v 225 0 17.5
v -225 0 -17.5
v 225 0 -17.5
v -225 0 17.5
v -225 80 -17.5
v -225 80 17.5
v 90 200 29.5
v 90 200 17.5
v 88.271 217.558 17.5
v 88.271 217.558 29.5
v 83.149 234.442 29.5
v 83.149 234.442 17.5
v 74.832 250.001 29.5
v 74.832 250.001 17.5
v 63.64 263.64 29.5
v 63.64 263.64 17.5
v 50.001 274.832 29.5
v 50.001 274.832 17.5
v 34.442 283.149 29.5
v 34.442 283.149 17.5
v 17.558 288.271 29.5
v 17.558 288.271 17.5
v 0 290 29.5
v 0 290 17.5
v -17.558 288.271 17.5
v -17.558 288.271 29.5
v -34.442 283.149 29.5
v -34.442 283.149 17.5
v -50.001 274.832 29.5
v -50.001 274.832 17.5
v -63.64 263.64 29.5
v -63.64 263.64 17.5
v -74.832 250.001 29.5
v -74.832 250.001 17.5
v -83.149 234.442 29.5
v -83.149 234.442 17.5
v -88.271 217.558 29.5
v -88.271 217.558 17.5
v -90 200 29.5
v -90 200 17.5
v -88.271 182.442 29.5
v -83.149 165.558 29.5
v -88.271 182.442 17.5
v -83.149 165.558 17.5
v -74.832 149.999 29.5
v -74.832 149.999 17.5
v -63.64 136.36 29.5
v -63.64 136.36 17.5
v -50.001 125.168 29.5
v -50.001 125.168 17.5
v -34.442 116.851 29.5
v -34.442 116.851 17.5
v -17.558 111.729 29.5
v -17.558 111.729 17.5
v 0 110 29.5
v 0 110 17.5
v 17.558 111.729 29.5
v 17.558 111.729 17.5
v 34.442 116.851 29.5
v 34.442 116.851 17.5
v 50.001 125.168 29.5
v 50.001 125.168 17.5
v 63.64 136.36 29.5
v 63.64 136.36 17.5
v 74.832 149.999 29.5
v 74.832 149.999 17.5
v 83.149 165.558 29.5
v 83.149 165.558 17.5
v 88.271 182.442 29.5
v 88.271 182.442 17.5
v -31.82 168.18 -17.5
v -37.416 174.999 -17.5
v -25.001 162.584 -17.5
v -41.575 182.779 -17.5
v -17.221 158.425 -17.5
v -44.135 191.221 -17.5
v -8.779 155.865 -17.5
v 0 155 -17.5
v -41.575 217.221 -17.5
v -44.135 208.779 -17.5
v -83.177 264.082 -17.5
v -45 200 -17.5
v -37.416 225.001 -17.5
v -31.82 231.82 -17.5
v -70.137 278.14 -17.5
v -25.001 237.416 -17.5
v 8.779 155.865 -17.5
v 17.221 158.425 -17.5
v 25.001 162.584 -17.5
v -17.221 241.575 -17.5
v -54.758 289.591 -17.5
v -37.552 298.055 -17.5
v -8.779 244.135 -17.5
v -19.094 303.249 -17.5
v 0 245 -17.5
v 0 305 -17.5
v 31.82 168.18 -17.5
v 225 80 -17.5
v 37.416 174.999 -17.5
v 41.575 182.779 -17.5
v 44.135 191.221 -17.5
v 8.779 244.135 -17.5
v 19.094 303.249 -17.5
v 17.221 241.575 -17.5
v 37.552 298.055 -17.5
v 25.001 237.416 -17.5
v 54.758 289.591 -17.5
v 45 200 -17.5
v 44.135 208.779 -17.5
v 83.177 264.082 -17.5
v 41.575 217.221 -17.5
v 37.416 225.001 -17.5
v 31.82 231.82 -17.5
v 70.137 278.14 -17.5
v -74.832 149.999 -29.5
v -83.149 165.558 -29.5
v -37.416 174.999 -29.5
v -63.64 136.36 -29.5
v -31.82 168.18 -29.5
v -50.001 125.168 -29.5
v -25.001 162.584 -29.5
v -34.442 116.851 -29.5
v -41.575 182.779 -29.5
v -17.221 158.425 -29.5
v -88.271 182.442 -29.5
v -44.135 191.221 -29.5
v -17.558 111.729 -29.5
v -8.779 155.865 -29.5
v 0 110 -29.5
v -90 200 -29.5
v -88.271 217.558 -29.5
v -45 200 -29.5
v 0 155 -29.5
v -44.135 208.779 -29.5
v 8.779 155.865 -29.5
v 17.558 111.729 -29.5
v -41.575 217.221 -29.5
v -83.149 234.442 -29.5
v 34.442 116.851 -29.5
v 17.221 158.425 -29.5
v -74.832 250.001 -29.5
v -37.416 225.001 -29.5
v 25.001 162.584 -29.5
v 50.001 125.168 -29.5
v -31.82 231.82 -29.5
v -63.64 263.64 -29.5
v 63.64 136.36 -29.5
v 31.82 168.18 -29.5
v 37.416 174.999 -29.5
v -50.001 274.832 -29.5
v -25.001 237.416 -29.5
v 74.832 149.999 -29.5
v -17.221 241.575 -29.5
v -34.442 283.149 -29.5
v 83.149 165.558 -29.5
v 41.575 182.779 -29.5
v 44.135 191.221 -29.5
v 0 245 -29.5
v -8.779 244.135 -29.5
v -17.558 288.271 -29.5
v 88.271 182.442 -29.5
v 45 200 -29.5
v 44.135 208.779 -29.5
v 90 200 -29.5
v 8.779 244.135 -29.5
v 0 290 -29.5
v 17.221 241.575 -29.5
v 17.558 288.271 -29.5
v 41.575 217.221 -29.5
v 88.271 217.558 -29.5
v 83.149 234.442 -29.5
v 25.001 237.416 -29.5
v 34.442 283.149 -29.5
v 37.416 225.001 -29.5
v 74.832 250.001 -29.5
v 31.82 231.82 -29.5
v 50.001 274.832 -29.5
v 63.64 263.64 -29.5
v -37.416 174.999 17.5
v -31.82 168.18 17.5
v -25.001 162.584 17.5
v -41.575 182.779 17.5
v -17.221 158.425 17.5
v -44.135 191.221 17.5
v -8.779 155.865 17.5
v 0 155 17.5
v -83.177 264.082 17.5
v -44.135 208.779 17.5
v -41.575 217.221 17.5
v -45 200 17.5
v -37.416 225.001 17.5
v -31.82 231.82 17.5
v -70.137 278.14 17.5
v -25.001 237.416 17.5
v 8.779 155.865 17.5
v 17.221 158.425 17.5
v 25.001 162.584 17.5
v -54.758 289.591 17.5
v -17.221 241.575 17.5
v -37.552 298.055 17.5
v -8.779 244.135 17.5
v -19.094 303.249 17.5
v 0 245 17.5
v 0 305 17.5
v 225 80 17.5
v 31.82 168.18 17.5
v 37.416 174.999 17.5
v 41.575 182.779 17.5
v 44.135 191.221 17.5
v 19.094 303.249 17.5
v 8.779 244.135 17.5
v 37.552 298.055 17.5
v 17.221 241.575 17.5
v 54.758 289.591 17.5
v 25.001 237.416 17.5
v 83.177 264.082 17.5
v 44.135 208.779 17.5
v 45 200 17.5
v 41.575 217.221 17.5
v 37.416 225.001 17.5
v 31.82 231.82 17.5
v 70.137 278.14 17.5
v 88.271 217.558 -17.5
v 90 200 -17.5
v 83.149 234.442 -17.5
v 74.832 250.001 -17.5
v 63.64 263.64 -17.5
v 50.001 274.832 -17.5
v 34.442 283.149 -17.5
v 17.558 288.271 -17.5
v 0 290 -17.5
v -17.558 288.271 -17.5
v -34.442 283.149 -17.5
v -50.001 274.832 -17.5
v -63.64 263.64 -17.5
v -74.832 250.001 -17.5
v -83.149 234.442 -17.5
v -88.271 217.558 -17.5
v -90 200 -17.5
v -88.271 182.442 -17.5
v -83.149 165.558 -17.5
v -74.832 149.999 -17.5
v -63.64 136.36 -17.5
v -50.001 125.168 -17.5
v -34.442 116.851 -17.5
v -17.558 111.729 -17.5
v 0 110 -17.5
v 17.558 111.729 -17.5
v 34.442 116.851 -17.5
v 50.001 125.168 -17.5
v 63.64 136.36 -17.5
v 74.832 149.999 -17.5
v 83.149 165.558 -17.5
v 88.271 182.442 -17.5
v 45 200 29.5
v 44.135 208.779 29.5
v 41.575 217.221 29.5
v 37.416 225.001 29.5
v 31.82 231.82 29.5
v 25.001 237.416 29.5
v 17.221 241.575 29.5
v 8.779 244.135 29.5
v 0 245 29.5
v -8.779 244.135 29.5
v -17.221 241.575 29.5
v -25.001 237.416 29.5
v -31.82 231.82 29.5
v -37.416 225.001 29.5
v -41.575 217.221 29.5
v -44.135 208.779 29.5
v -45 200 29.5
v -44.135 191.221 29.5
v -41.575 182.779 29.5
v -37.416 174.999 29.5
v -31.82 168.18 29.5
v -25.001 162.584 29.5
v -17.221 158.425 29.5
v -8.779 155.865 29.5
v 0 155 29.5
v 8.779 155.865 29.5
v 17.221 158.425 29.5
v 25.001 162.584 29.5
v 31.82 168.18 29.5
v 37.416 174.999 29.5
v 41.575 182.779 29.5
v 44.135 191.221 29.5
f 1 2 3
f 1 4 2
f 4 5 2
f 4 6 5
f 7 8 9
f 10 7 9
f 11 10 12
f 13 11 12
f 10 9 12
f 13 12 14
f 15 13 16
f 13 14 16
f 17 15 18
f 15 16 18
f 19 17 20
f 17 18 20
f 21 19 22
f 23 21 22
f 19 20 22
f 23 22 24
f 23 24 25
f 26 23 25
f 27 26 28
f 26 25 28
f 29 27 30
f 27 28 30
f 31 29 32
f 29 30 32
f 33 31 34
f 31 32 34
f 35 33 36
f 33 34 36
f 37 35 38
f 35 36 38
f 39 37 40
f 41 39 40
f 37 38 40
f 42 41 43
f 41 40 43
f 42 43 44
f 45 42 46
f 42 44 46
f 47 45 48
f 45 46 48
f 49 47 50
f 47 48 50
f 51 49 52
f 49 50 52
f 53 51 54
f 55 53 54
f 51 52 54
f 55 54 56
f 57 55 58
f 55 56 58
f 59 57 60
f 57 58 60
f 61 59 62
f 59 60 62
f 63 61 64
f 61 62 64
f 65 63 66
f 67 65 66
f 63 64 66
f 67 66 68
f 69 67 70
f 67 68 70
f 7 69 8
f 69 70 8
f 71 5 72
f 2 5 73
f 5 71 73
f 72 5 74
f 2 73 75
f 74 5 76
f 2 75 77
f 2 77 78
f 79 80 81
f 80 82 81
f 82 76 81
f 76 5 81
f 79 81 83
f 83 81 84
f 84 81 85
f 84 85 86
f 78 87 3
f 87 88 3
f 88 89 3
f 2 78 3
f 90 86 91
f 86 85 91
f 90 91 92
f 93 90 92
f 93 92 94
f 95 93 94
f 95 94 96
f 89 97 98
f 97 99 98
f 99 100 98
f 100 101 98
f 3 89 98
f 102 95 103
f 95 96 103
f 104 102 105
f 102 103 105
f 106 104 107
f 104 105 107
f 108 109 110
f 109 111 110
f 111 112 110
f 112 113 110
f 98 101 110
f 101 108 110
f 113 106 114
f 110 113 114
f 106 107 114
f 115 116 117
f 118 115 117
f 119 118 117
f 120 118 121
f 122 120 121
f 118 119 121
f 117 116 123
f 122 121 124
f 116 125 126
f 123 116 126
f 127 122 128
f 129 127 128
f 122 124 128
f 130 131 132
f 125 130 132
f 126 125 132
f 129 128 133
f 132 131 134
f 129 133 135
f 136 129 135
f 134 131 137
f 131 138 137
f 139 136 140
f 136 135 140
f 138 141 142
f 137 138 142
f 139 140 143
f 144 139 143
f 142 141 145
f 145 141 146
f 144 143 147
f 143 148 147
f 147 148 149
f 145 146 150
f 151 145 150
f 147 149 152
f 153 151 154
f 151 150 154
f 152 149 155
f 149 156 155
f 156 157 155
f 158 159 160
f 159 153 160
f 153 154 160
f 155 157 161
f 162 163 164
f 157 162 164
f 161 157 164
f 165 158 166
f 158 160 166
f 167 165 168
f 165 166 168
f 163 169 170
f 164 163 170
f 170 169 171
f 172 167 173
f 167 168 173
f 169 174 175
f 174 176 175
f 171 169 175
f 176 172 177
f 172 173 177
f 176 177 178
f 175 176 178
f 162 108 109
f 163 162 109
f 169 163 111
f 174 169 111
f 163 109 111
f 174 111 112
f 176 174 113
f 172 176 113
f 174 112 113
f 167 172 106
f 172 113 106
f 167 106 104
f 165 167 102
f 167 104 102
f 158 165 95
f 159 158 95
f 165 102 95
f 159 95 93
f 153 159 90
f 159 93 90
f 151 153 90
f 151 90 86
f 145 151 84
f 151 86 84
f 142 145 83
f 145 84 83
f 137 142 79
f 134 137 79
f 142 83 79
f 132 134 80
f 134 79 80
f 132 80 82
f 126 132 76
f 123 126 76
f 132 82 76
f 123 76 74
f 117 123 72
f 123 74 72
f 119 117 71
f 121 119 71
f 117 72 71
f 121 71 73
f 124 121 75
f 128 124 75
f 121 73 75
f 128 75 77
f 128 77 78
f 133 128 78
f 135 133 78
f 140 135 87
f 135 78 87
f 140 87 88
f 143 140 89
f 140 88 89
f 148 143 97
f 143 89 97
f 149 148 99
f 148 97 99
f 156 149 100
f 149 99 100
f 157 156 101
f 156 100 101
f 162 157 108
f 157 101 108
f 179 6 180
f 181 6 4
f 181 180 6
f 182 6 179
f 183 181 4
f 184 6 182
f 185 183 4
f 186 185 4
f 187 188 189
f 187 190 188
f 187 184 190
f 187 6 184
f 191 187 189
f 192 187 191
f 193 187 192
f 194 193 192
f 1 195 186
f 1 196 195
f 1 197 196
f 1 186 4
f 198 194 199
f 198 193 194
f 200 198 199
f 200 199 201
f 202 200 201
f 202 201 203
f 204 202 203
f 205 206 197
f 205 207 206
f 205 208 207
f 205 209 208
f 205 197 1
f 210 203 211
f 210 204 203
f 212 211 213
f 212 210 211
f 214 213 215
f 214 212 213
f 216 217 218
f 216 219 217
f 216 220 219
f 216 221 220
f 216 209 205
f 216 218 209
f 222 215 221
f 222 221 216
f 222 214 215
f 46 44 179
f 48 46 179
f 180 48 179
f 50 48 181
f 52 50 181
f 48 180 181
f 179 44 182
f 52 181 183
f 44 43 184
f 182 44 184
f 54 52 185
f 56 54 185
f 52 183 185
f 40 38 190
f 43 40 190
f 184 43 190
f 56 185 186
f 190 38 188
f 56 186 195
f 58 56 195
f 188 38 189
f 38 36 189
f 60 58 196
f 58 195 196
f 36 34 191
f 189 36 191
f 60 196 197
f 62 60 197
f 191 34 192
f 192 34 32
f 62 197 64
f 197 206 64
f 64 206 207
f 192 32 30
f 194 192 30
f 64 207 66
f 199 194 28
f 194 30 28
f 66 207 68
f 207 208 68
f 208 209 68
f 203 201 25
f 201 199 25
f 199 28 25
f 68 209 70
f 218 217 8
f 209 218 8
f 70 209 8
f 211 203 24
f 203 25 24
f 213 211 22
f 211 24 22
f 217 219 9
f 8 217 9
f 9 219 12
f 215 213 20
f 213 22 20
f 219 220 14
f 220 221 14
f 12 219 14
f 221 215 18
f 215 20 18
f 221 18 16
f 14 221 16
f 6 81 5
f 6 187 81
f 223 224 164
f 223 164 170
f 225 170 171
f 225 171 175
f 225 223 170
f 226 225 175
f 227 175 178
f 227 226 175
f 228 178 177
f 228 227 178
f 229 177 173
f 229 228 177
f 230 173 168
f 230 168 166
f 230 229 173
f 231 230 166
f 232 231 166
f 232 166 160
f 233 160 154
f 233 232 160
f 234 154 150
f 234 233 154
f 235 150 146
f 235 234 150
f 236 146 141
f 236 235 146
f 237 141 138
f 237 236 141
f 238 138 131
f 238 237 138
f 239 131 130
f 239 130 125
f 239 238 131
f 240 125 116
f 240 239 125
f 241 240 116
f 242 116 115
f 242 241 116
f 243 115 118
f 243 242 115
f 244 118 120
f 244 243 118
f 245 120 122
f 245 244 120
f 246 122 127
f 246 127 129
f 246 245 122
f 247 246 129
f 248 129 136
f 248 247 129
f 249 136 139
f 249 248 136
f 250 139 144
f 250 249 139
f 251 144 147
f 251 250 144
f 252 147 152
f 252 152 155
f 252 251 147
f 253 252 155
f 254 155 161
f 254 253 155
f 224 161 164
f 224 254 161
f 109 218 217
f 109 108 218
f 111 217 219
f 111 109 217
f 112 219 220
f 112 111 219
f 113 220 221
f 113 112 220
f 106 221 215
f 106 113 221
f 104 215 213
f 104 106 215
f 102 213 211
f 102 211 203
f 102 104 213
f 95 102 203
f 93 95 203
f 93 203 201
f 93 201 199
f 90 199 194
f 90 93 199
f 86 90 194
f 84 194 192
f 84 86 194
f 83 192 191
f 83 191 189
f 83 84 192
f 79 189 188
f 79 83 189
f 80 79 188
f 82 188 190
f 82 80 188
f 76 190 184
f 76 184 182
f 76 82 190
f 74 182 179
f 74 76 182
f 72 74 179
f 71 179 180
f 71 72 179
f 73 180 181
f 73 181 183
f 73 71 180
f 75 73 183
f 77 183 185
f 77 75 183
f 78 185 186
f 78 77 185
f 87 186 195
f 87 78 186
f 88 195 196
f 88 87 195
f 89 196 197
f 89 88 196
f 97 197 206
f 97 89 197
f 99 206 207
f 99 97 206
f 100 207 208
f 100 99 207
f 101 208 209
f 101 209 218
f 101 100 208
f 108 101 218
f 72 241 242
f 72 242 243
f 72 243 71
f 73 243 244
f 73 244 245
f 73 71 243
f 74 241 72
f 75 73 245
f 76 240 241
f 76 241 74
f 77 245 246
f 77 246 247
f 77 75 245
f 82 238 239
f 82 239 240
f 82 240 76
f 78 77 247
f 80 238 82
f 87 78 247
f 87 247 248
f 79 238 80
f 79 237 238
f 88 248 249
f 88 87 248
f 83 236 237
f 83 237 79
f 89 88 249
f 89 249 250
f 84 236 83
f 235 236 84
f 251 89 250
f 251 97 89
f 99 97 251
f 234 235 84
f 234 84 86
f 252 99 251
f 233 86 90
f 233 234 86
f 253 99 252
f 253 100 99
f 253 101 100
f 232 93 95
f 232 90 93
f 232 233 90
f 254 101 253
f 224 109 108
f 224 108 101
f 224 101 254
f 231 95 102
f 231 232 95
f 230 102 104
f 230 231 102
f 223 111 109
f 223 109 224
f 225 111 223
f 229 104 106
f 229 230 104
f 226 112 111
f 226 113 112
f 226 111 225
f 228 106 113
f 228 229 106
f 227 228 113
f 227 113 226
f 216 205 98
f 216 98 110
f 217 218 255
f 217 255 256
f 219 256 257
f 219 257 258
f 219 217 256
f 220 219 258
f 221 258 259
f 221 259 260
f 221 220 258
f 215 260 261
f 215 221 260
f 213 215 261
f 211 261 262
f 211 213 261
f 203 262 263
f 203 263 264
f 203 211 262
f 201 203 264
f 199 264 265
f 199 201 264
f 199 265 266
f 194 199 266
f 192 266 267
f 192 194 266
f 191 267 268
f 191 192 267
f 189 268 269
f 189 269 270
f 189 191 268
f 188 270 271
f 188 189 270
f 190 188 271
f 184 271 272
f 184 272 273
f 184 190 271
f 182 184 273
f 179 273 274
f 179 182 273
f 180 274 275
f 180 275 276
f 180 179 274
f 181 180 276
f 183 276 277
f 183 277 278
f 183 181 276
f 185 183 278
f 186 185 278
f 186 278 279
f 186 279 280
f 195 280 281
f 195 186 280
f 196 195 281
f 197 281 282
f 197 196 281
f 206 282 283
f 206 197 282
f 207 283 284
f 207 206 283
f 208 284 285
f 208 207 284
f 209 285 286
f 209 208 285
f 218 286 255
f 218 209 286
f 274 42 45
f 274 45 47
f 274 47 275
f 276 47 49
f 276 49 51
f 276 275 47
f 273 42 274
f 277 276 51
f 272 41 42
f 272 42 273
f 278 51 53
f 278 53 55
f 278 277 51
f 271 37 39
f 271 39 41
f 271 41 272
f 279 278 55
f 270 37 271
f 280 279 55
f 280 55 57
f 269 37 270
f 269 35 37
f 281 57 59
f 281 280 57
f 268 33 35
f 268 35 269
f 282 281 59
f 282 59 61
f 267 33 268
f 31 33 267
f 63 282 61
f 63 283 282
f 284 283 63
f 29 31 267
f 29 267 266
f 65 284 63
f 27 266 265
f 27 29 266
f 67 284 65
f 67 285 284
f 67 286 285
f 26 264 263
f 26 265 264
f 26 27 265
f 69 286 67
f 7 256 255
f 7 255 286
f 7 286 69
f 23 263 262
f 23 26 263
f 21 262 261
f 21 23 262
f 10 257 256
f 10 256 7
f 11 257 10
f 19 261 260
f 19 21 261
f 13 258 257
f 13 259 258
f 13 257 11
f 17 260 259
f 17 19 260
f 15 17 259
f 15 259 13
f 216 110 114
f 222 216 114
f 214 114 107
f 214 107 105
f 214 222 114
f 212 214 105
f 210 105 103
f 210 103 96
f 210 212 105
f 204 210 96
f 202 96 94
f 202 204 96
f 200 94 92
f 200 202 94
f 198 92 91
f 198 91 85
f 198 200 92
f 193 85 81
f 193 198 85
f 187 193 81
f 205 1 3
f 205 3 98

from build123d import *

# Parameters (mm, degrees)
SKETCH1_R           = 45
BOSS_EXTRUDE1_DEPTH = 17.5
SKETCH2_R           = 90
SKETCH2_R_2         = 45
BOSS_EXTRUDE2_DEPTH = 12


with BuildPart() as part:
    # Sketch1 → Boss-Extrude1 (new body, symmetric)
    with BuildSketch(Plane.XY):
        with BuildLine():
            Line((-225, 0), (225, 0))
            Line((225, 0), (225, 80))
            Line((225, 80), (83.177245824, 264.082335921))
            ThreePointArc((83.177245824, 264.082335921), (0, 305), (-83.177245824, 264.082335921))
            Line((-83.177245824, 264.082335921), (-225, 80))
            Line((-225, 80), (-225, 0))
        make_face()
        with Locations((0, 200)):
            Circle(SKETCH1_R, mode=Mode.SUBTRACT)
    extrude(amount=BOSS_EXTRUDE1_DEPTH, both=True)


with BuildPart() as body_2:
    # Sketch2 → Boss-Extrude2 (new body)
    with BuildSketch(Plane.XY.offset(17.5)):
        with Locations((0, 200)):
            Circle(SKETCH2_R)
        with Locations((0, 200)):
            Circle(SKETCH2_R_2, mode=Mode.SUBTRACT)
    extrude(amount=BOSS_EXTRUDE2_DEPTH)


with BuildPart() as body_3:
    # Mirror1: mirrored copy
    add(body_2.part.mirror(Plane.XY))


solid = Compound([part.part, body_2.part, body_3.part])
